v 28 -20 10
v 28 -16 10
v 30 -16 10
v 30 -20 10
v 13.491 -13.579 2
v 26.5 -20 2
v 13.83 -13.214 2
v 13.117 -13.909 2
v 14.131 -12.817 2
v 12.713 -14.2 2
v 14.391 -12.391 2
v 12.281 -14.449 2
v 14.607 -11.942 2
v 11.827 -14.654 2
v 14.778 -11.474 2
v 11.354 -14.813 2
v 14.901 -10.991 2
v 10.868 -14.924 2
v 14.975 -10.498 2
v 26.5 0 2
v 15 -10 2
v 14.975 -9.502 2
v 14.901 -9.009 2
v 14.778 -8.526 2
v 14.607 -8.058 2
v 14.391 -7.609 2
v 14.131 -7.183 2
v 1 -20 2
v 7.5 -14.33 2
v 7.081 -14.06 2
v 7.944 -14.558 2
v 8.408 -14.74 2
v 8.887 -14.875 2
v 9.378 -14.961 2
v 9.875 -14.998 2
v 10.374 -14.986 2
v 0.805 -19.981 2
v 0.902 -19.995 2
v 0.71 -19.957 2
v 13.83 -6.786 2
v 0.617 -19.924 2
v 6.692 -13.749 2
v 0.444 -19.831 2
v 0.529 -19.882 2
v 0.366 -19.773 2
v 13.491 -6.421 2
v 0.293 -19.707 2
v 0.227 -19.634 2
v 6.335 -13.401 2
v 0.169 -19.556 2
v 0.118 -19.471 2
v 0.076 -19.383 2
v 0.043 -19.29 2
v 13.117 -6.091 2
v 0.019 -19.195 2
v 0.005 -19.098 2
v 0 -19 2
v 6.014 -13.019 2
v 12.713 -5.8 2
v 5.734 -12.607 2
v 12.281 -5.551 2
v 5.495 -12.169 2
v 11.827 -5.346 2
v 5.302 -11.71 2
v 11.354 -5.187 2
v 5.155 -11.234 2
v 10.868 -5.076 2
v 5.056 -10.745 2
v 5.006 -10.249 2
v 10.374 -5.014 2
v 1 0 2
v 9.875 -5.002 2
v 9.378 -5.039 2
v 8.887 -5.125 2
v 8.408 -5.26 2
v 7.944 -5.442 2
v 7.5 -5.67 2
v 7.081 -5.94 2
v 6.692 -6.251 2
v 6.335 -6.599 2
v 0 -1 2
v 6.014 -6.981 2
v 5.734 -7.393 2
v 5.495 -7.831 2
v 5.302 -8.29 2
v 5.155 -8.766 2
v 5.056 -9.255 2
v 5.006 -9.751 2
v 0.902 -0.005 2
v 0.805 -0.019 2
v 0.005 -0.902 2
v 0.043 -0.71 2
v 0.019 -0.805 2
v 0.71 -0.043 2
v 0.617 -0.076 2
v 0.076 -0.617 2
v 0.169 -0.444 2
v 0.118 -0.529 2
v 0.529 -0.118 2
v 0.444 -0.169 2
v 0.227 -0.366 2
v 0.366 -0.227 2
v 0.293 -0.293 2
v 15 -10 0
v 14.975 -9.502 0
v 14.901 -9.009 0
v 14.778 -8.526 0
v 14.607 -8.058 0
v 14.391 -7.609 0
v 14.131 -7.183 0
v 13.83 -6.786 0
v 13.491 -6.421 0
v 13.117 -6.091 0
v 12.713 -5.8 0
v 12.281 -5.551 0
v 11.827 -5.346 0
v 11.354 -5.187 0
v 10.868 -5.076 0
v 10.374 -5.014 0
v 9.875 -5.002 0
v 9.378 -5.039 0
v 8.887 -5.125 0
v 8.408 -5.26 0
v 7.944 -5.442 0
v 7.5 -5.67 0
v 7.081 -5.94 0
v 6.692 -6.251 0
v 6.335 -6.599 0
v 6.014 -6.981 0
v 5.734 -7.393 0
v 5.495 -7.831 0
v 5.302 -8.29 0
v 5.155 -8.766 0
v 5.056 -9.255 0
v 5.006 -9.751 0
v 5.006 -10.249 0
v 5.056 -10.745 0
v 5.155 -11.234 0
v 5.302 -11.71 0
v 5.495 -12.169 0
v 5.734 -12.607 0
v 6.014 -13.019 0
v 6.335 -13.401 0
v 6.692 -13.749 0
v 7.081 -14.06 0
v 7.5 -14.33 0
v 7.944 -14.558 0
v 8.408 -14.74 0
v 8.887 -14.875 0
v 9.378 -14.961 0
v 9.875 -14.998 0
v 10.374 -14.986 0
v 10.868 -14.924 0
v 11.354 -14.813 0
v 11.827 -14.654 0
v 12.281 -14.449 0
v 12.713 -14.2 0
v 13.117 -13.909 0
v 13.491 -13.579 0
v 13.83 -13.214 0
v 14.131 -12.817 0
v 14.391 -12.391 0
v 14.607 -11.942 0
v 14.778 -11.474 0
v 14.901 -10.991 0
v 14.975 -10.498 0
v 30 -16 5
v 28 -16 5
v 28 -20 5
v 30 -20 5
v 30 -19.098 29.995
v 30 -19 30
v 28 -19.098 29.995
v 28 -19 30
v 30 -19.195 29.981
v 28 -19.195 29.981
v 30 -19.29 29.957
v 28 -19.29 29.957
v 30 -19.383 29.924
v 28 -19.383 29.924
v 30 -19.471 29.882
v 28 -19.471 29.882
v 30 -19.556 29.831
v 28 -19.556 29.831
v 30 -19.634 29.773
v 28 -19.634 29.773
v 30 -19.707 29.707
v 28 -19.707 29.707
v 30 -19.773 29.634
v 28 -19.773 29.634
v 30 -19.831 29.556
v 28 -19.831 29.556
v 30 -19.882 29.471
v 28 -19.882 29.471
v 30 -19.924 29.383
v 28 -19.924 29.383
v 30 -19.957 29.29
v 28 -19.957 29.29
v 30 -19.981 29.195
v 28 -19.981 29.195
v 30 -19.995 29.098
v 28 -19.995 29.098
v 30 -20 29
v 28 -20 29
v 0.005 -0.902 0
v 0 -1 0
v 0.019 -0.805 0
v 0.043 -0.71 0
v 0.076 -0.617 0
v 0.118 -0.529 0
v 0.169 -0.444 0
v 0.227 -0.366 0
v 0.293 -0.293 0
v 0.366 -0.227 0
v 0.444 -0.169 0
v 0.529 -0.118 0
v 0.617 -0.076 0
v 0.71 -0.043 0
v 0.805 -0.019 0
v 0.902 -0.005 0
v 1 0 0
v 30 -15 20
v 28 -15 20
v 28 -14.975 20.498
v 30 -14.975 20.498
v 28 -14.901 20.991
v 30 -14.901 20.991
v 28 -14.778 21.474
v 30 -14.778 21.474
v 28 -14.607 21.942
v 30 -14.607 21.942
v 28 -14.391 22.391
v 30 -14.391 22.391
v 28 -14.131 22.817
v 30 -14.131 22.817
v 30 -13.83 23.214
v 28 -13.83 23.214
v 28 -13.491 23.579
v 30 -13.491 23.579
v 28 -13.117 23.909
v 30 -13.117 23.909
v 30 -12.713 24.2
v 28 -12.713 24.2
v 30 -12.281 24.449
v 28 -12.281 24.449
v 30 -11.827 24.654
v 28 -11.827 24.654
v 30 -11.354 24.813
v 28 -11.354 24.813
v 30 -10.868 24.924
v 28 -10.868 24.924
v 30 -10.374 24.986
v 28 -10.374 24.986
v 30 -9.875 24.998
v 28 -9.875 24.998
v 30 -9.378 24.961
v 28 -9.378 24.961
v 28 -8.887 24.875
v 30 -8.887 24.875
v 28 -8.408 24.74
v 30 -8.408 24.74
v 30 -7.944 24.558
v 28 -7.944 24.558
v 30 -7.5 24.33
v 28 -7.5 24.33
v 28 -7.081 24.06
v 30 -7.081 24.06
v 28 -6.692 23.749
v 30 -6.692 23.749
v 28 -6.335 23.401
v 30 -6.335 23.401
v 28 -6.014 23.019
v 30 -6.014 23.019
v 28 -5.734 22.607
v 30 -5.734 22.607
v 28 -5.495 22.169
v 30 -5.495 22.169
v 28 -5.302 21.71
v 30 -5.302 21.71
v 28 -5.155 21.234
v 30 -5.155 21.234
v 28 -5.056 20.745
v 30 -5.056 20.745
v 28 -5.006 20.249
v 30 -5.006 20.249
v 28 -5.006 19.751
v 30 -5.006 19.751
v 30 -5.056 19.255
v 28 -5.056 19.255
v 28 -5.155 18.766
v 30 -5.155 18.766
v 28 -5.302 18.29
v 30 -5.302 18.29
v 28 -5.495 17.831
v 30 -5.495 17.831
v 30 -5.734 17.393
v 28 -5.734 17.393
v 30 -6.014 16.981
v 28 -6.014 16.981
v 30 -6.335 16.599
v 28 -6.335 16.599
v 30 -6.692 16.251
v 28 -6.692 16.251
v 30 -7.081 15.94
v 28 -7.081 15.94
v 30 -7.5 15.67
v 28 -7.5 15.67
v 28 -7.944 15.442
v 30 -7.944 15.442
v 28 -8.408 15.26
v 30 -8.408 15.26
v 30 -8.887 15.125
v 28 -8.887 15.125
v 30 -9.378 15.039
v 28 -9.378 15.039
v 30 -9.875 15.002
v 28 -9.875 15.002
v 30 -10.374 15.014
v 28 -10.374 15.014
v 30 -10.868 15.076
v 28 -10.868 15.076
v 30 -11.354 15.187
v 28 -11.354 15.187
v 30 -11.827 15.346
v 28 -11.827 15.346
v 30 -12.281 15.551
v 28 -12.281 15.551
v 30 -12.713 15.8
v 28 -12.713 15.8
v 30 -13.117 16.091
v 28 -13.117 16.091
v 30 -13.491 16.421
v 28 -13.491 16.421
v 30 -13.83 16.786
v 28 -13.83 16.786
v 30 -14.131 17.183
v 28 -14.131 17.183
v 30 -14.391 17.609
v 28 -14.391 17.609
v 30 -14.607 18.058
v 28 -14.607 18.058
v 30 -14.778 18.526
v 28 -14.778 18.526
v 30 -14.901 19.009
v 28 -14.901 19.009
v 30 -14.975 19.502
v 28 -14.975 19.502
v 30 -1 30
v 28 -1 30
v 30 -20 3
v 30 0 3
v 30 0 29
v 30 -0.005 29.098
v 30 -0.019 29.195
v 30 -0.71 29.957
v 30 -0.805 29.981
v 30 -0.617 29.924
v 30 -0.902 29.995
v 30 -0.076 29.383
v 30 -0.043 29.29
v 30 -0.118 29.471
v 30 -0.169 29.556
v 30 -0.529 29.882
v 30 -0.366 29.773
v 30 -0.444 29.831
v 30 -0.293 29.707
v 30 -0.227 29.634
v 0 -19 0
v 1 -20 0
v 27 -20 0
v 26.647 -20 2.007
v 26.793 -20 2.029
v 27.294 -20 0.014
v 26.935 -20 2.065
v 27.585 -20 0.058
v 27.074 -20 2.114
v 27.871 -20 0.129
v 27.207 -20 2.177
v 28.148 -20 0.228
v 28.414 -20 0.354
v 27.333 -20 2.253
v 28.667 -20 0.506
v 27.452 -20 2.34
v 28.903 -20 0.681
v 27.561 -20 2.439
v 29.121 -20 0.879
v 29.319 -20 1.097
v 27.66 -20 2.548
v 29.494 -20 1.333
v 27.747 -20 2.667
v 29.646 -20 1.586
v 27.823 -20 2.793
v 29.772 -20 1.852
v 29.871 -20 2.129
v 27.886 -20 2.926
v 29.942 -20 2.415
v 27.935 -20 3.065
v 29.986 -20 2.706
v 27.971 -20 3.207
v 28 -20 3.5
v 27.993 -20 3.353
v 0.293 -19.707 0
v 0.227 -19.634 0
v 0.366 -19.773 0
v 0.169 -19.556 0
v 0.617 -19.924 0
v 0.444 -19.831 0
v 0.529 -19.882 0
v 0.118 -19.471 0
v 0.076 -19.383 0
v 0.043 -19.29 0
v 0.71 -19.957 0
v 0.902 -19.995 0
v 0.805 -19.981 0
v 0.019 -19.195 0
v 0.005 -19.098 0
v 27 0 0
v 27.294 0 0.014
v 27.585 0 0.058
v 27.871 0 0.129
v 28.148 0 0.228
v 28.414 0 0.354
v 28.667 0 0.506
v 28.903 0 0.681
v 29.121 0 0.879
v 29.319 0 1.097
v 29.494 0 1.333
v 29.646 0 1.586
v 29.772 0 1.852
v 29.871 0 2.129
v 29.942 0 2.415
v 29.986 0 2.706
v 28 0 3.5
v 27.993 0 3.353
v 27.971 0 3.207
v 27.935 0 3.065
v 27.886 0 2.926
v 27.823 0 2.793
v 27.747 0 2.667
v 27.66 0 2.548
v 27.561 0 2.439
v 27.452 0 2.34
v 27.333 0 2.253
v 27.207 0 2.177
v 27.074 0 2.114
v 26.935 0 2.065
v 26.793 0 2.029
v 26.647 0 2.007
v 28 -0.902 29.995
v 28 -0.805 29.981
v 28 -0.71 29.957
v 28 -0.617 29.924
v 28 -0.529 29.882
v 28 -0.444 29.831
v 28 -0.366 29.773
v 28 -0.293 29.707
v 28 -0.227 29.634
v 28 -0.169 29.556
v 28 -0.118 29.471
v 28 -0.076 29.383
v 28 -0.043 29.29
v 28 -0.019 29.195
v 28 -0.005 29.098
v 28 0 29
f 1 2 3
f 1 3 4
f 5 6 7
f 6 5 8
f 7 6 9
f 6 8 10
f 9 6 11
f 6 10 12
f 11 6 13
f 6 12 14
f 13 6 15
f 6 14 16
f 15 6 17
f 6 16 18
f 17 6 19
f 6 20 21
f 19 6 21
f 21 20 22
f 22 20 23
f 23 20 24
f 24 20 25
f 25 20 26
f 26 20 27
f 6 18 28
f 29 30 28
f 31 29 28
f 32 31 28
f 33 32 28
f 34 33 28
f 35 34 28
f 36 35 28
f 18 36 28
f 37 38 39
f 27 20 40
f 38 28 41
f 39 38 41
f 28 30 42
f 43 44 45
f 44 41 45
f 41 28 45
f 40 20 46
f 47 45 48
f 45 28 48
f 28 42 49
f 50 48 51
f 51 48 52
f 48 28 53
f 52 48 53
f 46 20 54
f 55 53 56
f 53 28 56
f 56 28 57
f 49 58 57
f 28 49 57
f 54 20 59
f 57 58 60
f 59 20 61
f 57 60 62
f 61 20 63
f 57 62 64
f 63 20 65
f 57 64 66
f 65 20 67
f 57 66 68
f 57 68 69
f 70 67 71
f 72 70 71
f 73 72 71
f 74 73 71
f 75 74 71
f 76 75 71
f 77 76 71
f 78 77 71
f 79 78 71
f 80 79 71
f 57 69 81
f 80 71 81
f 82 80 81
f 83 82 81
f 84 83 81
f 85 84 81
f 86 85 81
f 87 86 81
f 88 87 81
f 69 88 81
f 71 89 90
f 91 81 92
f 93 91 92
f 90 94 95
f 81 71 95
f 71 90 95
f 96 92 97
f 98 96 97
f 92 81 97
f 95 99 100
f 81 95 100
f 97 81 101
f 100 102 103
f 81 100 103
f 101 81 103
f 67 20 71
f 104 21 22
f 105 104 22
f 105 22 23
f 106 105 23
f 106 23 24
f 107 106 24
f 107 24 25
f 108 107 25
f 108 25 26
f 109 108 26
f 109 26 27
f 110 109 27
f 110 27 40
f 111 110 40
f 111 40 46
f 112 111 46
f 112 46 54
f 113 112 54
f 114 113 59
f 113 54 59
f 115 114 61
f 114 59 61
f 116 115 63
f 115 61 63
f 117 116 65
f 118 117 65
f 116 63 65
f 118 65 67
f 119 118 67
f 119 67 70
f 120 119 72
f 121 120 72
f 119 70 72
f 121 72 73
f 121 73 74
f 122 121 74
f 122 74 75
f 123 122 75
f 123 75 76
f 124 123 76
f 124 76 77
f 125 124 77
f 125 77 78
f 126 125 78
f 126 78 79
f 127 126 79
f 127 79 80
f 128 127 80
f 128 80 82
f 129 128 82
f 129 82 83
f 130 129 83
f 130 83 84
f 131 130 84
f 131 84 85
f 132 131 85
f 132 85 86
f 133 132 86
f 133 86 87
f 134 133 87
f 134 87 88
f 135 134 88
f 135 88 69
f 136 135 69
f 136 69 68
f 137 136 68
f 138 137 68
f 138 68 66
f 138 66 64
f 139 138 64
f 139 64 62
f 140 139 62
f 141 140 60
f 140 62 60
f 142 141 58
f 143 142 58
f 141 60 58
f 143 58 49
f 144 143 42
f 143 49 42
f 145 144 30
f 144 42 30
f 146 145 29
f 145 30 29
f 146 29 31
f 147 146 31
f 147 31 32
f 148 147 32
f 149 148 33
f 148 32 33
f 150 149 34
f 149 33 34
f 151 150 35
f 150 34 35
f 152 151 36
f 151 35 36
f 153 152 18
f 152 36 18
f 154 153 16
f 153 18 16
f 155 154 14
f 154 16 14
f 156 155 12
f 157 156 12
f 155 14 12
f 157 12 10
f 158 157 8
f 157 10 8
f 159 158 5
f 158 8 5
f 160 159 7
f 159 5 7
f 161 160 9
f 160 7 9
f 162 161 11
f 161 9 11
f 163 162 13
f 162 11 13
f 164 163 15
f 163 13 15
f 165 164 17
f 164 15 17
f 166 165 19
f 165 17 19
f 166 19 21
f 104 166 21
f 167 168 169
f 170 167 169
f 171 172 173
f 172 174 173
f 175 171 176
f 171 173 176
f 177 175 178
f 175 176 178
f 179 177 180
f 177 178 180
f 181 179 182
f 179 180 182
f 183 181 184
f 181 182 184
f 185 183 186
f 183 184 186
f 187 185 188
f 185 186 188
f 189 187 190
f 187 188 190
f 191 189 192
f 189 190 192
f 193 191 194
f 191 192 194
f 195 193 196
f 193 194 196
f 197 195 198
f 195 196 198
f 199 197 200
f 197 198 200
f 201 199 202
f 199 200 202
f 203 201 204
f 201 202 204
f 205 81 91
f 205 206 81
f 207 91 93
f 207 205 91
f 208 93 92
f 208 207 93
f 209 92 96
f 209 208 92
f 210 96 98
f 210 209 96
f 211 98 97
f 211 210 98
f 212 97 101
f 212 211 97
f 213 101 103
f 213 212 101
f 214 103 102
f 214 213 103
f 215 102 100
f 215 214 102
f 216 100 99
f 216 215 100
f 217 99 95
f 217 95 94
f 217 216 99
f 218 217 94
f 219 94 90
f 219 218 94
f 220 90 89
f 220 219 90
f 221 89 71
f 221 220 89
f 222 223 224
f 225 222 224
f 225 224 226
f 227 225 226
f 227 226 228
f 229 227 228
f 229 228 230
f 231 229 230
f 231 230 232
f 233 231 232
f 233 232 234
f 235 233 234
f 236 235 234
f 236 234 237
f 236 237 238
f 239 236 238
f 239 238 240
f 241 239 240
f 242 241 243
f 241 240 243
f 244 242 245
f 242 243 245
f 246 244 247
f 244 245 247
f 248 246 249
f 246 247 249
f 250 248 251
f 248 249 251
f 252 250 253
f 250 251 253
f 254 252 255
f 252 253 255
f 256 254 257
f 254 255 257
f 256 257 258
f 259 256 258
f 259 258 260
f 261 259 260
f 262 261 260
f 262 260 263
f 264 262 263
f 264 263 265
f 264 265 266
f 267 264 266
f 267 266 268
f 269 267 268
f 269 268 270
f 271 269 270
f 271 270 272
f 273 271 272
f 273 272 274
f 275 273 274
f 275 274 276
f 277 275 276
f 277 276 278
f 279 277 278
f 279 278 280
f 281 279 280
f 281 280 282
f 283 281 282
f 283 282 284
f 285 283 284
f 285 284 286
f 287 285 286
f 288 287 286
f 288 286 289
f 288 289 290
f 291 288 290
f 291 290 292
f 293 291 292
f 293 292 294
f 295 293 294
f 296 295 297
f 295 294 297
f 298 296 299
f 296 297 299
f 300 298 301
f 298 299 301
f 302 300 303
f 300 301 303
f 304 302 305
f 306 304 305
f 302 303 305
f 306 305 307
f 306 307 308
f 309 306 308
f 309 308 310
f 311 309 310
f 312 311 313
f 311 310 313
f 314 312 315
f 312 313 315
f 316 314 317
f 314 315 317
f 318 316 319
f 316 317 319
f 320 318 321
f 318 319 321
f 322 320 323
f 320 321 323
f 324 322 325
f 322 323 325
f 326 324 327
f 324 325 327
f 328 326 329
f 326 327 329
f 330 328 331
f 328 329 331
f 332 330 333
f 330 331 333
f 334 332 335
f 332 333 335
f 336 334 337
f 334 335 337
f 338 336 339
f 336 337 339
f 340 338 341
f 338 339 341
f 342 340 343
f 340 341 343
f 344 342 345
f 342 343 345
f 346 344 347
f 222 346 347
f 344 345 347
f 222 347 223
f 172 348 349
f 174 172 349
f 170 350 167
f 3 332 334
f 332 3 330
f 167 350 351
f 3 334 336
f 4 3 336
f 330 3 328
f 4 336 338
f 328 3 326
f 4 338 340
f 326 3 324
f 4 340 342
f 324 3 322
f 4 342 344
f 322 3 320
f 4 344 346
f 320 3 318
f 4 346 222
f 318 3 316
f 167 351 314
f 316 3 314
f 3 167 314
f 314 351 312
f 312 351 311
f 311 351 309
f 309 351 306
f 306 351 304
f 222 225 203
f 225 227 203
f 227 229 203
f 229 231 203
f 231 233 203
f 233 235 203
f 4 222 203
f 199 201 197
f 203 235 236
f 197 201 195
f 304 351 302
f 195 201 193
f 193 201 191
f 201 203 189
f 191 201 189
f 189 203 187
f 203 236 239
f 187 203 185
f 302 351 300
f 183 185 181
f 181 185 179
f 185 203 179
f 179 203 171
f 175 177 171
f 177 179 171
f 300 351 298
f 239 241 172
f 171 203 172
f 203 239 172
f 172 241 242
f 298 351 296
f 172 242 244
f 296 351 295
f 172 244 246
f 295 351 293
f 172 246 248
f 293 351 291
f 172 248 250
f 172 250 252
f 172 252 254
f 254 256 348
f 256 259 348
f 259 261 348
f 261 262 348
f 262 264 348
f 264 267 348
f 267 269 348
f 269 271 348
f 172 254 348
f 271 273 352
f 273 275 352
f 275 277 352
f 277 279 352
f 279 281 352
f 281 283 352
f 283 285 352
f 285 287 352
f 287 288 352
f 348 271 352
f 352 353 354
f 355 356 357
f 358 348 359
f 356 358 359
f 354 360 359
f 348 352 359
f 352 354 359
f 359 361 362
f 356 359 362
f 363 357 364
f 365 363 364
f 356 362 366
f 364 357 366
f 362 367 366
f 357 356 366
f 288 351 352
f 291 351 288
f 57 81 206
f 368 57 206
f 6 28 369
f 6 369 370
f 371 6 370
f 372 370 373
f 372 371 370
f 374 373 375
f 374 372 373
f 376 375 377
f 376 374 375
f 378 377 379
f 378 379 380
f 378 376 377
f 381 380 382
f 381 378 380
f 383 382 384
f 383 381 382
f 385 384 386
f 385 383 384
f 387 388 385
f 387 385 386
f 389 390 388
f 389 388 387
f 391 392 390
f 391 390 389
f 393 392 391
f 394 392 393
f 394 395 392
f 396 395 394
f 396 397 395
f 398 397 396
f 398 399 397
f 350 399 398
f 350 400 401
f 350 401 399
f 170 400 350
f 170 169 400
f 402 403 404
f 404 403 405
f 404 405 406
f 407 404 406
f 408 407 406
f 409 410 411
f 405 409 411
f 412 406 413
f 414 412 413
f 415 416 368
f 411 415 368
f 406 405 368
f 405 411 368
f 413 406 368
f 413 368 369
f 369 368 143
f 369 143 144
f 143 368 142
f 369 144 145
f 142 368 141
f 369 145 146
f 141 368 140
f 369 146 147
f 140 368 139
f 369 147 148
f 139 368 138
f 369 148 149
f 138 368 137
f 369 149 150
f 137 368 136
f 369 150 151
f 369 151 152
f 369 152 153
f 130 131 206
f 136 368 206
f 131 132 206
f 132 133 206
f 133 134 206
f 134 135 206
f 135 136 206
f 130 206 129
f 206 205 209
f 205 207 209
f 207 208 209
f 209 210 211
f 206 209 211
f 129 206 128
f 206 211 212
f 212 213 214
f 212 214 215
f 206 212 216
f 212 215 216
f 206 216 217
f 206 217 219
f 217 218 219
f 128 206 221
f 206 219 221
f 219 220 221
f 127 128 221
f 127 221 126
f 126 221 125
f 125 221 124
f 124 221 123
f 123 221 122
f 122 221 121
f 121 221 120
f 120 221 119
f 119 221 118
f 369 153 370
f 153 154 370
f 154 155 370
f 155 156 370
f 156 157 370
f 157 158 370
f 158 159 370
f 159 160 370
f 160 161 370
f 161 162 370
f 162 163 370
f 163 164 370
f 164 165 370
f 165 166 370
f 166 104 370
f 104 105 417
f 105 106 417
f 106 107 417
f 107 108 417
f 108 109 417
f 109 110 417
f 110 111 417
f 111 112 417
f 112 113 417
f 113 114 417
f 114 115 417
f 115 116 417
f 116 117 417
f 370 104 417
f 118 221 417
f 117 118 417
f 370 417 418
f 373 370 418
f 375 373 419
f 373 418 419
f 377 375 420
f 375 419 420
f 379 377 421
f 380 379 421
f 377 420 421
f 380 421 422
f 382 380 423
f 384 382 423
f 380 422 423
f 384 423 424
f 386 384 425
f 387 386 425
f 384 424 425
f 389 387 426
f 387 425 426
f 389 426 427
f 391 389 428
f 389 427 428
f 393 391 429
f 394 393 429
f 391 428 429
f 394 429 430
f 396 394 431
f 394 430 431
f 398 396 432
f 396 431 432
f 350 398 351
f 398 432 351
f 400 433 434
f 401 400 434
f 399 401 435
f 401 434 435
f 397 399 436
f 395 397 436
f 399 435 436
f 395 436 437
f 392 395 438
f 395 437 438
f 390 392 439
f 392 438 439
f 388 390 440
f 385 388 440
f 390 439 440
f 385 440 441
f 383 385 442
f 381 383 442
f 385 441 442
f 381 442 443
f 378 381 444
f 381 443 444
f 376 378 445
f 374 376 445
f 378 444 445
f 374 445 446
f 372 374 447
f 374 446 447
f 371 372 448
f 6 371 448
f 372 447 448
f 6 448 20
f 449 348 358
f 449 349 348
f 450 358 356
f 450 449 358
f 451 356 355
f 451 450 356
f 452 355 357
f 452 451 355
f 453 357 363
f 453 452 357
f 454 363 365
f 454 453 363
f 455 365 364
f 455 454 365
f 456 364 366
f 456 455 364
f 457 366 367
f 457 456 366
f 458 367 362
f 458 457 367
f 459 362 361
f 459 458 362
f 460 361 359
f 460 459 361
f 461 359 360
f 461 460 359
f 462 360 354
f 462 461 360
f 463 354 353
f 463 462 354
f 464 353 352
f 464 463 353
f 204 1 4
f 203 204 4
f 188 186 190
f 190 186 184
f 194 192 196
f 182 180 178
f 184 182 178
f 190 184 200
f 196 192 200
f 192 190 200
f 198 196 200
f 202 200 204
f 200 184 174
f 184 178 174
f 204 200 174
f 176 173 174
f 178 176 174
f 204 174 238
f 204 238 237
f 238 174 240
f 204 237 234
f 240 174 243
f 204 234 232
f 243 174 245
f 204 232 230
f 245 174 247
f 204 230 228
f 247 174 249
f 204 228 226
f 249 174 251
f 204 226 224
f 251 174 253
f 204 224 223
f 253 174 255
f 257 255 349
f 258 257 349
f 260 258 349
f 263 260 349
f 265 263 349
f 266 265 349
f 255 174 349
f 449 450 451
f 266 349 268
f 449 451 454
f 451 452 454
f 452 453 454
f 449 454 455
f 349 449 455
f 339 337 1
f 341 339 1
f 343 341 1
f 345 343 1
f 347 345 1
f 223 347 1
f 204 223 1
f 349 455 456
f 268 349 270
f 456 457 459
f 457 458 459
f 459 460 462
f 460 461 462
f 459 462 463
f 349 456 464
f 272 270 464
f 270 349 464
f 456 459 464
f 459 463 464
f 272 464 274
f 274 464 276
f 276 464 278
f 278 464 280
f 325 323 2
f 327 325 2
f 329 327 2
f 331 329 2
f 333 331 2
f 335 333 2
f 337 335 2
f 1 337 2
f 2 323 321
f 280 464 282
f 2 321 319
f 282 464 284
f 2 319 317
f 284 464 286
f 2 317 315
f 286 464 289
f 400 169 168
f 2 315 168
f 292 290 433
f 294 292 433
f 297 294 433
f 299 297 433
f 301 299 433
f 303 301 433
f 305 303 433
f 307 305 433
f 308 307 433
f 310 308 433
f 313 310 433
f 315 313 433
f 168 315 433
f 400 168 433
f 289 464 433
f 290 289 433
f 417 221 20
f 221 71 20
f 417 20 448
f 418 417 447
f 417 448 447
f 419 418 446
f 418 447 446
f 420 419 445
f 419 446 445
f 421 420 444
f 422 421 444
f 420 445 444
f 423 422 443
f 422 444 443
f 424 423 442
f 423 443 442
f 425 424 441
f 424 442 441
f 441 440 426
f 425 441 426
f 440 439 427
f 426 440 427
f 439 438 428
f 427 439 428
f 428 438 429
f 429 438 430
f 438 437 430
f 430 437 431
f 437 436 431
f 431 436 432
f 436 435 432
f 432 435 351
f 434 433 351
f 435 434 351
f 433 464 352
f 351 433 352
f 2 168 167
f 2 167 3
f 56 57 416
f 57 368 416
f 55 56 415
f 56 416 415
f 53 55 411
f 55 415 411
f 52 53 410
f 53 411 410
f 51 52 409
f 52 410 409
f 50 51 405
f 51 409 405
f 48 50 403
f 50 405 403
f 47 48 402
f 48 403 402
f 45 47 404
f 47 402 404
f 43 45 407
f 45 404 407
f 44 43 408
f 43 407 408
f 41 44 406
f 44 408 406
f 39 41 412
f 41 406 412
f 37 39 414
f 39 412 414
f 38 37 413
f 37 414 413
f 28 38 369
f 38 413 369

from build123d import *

# Parameters (mm, degrees)
F1_DEPTH = 20
F2_R     = 1
F3_R     = 5
F3_W     = 5
F3_H     = 5
F4_DEPTH = 2.001
F5_R     = 5
F6_DEPTH = 2.001


with BuildPart() as f1:
    # F0 (on Front) → F1 (new body)
    with BuildSketch(Plane.XZ):
        with BuildLine():
            Line((0, 2), (0, 0))
            Line((0, 0), (27, 0))
            ThreePointArc((27, 0), (29.12132, 0.87868), (30, 3))
            Line((30, 3), (30, 30))
            Line((30, 30), (28, 30))
            Line((28, 30), (28, 3.5))
            ThreePointArc((28, 3.5), (27.56066, 2.43934), (26.5, 2))
            Line((26.5, 2), (0, 2))
        make_face()
    extrude(amount=F1_DEPTH)

    # F2
    f2_edges = [f1.edges().sort_by_distance(p)[0] for p in [
        (29, -20, 30),
        (29, 0, 30),
        (0, -20, 1),
        (0, 0, 1),
    ]]
    fillet(f2_edges, radius=F2_R)

    # F3 (on face) → F4 (cut, through all)
    with BuildSketch(Plane(origin=(28, 0, 0), x_dir=(0, -1, 0), z_dir=(-1, 0, 0))):
        with Locations((10, 20)):
            Circle(F3_R)
        with Locations((18.5, 7.5)):
            Rectangle(F3_W, F3_H)
    extrude(amount=-F4_DEPTH, mode=Mode.SUBTRACT)

    # F5 (on face) → F6 (cut, through all)
    with BuildSketch(Plane.XY.offset(2)):
        with Locations((10, -10)):
            Circle(F5_R)
    extrude(amount=-F6_DEPTH, mode=Mode.SUBTRACT)


solid = f1.part
